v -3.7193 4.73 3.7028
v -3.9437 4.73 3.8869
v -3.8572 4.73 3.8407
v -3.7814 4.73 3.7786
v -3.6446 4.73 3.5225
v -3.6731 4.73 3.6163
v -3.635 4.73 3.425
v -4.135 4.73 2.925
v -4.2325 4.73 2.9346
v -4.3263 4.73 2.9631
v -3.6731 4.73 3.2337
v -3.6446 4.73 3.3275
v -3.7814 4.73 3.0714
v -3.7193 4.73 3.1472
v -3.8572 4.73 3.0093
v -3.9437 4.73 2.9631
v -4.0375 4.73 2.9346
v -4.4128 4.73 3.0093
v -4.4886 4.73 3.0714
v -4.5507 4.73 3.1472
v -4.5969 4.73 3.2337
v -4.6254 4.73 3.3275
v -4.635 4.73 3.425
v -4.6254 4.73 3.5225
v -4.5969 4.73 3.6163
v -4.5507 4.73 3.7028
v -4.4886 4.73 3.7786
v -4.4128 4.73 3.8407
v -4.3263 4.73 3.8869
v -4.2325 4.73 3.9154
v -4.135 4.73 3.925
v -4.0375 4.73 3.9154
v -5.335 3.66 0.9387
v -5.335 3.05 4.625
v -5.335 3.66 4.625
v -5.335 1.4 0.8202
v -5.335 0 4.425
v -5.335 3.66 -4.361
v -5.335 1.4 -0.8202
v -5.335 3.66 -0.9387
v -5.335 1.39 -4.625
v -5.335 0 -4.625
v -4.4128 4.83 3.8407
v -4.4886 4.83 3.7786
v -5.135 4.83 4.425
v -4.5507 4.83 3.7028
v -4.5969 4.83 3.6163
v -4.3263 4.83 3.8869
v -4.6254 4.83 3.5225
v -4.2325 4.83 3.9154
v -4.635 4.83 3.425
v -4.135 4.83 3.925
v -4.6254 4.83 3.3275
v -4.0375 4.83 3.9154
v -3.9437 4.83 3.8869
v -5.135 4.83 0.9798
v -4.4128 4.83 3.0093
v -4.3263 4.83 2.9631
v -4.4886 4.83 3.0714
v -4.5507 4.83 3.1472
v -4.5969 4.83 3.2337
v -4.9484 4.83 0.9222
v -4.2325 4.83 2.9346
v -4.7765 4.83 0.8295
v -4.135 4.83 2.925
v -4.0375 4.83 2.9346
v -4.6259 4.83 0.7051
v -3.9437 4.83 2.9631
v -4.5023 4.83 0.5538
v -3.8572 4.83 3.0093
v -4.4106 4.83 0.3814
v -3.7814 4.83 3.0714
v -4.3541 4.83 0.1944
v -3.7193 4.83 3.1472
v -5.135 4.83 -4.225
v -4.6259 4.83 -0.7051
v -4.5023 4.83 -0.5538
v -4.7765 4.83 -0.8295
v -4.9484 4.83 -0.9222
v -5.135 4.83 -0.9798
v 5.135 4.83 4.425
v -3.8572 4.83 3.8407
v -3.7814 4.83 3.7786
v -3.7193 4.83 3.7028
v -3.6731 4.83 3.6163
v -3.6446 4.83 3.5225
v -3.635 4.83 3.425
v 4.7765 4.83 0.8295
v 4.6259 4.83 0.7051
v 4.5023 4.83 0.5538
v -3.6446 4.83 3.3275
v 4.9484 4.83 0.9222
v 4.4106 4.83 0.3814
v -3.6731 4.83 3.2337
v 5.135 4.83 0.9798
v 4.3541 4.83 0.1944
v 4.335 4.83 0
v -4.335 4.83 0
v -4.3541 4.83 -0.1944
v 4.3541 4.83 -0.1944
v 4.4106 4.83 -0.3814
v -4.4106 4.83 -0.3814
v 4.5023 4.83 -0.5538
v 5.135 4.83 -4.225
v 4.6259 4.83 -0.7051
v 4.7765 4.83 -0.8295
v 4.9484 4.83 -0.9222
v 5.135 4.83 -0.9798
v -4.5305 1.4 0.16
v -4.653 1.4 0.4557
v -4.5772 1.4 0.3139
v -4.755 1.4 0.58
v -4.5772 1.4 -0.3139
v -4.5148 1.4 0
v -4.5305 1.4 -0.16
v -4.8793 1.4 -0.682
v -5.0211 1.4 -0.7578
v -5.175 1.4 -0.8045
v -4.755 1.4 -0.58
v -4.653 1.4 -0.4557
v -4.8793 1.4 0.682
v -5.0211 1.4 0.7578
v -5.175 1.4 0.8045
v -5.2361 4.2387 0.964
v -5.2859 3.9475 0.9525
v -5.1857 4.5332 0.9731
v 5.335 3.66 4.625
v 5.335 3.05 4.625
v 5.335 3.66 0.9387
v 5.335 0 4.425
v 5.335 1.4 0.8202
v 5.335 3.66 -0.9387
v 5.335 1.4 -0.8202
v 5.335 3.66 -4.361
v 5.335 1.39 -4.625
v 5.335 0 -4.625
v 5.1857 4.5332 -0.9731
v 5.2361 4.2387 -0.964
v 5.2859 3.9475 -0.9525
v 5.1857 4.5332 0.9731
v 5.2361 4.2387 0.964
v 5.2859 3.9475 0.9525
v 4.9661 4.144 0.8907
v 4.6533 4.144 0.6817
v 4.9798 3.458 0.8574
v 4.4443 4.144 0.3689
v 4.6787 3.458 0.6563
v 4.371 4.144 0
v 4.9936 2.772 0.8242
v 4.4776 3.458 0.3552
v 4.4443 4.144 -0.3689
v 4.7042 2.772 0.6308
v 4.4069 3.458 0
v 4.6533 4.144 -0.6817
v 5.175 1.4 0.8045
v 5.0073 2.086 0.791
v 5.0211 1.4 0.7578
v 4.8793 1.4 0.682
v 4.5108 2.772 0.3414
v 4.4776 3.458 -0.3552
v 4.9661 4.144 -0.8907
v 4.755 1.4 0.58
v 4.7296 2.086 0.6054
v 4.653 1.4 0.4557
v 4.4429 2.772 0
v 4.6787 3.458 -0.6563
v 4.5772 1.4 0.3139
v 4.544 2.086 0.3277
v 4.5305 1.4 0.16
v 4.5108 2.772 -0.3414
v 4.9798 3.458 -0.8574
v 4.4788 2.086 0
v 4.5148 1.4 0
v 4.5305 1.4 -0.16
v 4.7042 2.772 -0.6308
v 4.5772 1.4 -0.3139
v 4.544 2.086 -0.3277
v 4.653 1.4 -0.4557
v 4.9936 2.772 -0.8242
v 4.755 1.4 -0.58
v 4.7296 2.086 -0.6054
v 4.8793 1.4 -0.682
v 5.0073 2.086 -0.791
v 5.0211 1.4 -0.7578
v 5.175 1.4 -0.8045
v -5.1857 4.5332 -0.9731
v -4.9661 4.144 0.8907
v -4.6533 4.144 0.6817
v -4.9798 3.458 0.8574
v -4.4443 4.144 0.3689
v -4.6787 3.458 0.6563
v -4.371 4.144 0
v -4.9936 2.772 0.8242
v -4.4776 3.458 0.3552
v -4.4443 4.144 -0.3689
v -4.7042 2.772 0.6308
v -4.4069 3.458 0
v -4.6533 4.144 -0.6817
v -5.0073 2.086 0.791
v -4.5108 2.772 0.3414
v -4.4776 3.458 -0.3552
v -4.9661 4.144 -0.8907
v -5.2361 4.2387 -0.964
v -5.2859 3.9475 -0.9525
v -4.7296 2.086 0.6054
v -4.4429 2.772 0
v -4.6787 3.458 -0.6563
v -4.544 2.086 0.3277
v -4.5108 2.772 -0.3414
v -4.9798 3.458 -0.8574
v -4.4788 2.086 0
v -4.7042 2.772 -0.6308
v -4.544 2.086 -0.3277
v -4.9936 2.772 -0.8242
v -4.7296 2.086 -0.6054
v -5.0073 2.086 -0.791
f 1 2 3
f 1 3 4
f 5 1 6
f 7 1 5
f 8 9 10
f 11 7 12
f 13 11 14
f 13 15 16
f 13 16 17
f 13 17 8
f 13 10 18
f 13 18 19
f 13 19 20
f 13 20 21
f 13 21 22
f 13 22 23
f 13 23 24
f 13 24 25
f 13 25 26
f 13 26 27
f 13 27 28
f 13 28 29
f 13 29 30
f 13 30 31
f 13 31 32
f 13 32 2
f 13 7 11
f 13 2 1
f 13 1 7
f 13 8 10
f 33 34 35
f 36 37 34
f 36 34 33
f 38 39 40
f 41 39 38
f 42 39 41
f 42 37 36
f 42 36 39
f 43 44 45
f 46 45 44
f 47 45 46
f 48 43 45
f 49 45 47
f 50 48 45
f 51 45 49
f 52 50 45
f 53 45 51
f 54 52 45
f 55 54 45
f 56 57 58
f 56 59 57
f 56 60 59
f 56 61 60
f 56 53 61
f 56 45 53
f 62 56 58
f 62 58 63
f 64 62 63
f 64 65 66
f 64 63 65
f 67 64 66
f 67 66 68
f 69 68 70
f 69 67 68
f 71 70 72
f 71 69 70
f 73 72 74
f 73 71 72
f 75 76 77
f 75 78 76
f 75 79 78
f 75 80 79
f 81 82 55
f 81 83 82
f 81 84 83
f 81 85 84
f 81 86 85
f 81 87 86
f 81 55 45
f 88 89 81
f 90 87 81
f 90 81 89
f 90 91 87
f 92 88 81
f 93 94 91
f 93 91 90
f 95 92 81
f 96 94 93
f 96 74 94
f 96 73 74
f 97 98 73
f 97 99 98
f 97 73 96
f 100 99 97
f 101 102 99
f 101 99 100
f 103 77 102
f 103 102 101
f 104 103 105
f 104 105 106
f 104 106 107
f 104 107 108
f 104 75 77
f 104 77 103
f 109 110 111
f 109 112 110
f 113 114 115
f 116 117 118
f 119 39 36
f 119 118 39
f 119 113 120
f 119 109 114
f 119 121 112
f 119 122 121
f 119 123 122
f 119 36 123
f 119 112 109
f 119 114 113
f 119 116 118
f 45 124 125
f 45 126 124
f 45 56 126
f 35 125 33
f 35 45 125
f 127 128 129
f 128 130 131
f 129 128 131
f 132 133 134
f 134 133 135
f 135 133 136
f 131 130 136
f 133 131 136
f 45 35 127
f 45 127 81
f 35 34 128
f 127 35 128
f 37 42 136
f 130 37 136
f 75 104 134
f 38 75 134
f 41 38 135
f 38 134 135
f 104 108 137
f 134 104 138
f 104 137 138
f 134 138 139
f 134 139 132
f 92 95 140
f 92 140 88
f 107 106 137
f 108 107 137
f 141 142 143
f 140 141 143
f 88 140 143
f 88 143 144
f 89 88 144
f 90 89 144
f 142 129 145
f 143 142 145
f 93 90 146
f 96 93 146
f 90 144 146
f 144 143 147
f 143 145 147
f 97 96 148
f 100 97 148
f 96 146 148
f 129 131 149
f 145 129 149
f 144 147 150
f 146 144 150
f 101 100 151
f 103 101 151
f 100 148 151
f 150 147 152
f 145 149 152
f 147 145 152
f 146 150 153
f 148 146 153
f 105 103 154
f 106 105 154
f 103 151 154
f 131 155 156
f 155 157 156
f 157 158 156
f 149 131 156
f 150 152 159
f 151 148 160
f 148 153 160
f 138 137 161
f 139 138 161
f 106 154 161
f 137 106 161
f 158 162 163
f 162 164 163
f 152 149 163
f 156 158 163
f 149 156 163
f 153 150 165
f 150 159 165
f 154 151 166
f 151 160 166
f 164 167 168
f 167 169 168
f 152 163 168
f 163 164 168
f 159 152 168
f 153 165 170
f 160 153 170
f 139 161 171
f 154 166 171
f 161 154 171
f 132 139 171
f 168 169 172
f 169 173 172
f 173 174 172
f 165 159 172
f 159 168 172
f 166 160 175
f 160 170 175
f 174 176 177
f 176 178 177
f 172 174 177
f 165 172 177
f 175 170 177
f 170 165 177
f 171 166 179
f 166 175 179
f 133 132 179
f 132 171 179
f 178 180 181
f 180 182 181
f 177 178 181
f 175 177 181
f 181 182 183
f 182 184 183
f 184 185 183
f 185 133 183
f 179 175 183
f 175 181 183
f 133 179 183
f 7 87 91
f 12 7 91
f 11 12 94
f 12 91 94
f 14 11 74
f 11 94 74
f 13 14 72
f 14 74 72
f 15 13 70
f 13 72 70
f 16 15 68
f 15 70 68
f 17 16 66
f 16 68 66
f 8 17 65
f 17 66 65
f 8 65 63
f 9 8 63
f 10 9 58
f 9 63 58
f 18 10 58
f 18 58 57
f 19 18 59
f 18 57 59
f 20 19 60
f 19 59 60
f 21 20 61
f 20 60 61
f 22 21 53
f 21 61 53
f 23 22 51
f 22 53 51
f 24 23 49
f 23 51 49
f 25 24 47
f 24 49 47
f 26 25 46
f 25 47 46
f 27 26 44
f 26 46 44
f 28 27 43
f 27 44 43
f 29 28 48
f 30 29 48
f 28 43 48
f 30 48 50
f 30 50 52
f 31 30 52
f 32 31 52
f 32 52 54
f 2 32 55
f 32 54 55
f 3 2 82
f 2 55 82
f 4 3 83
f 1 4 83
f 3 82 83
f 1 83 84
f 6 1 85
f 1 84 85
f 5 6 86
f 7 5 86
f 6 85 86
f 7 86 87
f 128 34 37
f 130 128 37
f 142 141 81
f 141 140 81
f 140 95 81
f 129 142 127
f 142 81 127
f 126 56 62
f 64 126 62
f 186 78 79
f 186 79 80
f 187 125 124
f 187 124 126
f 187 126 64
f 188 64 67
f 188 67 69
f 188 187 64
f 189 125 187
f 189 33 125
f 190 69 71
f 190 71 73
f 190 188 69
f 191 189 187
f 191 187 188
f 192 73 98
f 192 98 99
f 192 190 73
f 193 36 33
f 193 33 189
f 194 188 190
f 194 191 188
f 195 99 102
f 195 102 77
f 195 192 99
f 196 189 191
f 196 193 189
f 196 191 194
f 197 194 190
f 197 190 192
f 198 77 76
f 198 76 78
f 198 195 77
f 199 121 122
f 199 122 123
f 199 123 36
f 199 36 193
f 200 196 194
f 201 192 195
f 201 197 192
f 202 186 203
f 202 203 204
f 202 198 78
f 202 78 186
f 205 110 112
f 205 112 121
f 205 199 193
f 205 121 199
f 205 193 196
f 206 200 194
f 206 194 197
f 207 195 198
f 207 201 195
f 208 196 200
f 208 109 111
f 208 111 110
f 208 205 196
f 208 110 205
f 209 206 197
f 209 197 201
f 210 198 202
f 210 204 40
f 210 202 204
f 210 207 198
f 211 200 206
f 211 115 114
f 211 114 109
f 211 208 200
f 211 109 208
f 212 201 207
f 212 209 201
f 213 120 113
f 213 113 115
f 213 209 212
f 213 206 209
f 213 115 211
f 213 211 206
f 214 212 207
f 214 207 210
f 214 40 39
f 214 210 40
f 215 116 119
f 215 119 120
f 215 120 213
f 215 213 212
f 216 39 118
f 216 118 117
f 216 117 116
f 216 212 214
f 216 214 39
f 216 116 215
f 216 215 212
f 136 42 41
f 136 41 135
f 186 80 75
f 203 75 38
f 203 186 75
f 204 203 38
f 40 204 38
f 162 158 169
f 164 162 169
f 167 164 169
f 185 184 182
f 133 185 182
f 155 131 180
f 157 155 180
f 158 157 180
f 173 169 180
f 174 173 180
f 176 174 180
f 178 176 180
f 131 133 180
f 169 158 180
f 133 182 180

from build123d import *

# Parameters (mm, degrees)
SKETCH1_W           = 10.67
SKETCH1_H           = 9.25
BOSS_EXTRUDE1_DEPTH = 4.83
CUT_EXTRUDE1_DEPTH  = 11.67
CUT_EXTRUDE2_DEPTH  = 10.25
CUT_EXTRUDE3_DEPTH  = 11.67
CUT_EXTRUDE4_DEPTH  = 11.67
SKETCH7_R           = 1
CUT_EXTRUDE5_DEPTH  = 3.43
CUT_EXTRUDE5_TAPER  = 3
SKETCH8_R           = 0.5
CUT_EXTRUDE6_DEPTH  = 0.1


with BuildPart() as part:
    # Sketch1 → Boss-Extrude1 (new body)
    with BuildSketch(Plane(origin=(0, 0, 0), x_dir=(1, 0, 0), z_dir=(0, 1, 0))):
        Rectangle(SKETCH1_W, SKETCH1_H)
    extrude(amount=BOSS_EXTRUDE1_DEPTH)

    # Sketch3 → Cut-Extrude1 (cut, through all)
    with BuildSketch(Plane(origin=(5.335, 0, 0), x_dir=(0, 0, -1), z_dir=(1, 0, 0))):
        Polygon((4.625, 4.83), (4.225, 4.83), (4.625, 1.39), align=None)
    extrude(amount=-CUT_EXTRUDE1_DEPTH, mode=Mode.SUBTRACT)

    # Sketch4 → Cut-Extrude2 (cut, through all)
    with BuildSketch(Plane.XY.offset(4.625)):
        Polygon((5.335, 4.83), (5.135, 4.83), (5.335, 3.66), align=None)
    cut_extrude2 = extrude(amount=-CUT_EXTRUDE2_DEPTH, mode=Mode.SUBTRACT)

    # Mirror1: Cut-Extrude2 across plane
    add(cut_extrude2.mirror(Plane(origin=(0, 0, 0), x_dir=(0, 0, 1), z_dir=(1, 0, 0))), mode=Mode.SUBTRACT)

    # Sketch5 → Cut-Extrude3 (cut, through all)
    with BuildSketch(Plane.ZY.offset(5.335)):
        Polygon((4.425, 4.83), (4.625, 4.83), (4.625, 3.66), align=None)
    extrude(amount=-CUT_EXTRUDE3_DEPTH, mode=Mode.SUBTRACT)

    # Sketch6 → Cut-Extrude4 (cut, through all)
    with BuildSketch(Plane.ZY.offset(5.335)):
        Polygon((4.625, 0), (4.625, 3.05), (4.425, 0), align=None)
    extrude(amount=-CUT_EXTRUDE4_DEPTH, mode=Mode.SUBTRACT)

    # Sketch7 → Cut-Extrude5 (cut)
    with BuildSketch(Plane(origin=(0, 4.83, 0), x_dir=(1, 0, 0), z_dir=(0, 1, 0))):
        with Locations((-5.335, 0)):
            Circle(SKETCH7_R)
    cut_extrude5 = extrude(amount=-CUT_EXTRUDE5_DEPTH, taper=CUT_EXTRUDE5_TAPER, mode=Mode.SUBTRACT)

    # Mirror2: Cut-Extrude5 across plane
    add(cut_extrude5.mirror(Plane(origin=(0, 0, 0), x_dir=(0, 0, 1), z_dir=(1, 0, 0))), mode=Mode.SUBTRACT)

    # Sketch8 → Cut-Extrude6 (cut)
    with BuildSketch(Plane(origin=(0, 4.83, 0), x_dir=(1, 0, 0), z_dir=(0, 1, 0))):
        with Locations((-4.135, -3.425)):
            Circle(SKETCH8_R)
    extrude(amount=-CUT_EXTRUDE6_DEPTH, mode=Mode.SUBTRACT)


solid = part.part
